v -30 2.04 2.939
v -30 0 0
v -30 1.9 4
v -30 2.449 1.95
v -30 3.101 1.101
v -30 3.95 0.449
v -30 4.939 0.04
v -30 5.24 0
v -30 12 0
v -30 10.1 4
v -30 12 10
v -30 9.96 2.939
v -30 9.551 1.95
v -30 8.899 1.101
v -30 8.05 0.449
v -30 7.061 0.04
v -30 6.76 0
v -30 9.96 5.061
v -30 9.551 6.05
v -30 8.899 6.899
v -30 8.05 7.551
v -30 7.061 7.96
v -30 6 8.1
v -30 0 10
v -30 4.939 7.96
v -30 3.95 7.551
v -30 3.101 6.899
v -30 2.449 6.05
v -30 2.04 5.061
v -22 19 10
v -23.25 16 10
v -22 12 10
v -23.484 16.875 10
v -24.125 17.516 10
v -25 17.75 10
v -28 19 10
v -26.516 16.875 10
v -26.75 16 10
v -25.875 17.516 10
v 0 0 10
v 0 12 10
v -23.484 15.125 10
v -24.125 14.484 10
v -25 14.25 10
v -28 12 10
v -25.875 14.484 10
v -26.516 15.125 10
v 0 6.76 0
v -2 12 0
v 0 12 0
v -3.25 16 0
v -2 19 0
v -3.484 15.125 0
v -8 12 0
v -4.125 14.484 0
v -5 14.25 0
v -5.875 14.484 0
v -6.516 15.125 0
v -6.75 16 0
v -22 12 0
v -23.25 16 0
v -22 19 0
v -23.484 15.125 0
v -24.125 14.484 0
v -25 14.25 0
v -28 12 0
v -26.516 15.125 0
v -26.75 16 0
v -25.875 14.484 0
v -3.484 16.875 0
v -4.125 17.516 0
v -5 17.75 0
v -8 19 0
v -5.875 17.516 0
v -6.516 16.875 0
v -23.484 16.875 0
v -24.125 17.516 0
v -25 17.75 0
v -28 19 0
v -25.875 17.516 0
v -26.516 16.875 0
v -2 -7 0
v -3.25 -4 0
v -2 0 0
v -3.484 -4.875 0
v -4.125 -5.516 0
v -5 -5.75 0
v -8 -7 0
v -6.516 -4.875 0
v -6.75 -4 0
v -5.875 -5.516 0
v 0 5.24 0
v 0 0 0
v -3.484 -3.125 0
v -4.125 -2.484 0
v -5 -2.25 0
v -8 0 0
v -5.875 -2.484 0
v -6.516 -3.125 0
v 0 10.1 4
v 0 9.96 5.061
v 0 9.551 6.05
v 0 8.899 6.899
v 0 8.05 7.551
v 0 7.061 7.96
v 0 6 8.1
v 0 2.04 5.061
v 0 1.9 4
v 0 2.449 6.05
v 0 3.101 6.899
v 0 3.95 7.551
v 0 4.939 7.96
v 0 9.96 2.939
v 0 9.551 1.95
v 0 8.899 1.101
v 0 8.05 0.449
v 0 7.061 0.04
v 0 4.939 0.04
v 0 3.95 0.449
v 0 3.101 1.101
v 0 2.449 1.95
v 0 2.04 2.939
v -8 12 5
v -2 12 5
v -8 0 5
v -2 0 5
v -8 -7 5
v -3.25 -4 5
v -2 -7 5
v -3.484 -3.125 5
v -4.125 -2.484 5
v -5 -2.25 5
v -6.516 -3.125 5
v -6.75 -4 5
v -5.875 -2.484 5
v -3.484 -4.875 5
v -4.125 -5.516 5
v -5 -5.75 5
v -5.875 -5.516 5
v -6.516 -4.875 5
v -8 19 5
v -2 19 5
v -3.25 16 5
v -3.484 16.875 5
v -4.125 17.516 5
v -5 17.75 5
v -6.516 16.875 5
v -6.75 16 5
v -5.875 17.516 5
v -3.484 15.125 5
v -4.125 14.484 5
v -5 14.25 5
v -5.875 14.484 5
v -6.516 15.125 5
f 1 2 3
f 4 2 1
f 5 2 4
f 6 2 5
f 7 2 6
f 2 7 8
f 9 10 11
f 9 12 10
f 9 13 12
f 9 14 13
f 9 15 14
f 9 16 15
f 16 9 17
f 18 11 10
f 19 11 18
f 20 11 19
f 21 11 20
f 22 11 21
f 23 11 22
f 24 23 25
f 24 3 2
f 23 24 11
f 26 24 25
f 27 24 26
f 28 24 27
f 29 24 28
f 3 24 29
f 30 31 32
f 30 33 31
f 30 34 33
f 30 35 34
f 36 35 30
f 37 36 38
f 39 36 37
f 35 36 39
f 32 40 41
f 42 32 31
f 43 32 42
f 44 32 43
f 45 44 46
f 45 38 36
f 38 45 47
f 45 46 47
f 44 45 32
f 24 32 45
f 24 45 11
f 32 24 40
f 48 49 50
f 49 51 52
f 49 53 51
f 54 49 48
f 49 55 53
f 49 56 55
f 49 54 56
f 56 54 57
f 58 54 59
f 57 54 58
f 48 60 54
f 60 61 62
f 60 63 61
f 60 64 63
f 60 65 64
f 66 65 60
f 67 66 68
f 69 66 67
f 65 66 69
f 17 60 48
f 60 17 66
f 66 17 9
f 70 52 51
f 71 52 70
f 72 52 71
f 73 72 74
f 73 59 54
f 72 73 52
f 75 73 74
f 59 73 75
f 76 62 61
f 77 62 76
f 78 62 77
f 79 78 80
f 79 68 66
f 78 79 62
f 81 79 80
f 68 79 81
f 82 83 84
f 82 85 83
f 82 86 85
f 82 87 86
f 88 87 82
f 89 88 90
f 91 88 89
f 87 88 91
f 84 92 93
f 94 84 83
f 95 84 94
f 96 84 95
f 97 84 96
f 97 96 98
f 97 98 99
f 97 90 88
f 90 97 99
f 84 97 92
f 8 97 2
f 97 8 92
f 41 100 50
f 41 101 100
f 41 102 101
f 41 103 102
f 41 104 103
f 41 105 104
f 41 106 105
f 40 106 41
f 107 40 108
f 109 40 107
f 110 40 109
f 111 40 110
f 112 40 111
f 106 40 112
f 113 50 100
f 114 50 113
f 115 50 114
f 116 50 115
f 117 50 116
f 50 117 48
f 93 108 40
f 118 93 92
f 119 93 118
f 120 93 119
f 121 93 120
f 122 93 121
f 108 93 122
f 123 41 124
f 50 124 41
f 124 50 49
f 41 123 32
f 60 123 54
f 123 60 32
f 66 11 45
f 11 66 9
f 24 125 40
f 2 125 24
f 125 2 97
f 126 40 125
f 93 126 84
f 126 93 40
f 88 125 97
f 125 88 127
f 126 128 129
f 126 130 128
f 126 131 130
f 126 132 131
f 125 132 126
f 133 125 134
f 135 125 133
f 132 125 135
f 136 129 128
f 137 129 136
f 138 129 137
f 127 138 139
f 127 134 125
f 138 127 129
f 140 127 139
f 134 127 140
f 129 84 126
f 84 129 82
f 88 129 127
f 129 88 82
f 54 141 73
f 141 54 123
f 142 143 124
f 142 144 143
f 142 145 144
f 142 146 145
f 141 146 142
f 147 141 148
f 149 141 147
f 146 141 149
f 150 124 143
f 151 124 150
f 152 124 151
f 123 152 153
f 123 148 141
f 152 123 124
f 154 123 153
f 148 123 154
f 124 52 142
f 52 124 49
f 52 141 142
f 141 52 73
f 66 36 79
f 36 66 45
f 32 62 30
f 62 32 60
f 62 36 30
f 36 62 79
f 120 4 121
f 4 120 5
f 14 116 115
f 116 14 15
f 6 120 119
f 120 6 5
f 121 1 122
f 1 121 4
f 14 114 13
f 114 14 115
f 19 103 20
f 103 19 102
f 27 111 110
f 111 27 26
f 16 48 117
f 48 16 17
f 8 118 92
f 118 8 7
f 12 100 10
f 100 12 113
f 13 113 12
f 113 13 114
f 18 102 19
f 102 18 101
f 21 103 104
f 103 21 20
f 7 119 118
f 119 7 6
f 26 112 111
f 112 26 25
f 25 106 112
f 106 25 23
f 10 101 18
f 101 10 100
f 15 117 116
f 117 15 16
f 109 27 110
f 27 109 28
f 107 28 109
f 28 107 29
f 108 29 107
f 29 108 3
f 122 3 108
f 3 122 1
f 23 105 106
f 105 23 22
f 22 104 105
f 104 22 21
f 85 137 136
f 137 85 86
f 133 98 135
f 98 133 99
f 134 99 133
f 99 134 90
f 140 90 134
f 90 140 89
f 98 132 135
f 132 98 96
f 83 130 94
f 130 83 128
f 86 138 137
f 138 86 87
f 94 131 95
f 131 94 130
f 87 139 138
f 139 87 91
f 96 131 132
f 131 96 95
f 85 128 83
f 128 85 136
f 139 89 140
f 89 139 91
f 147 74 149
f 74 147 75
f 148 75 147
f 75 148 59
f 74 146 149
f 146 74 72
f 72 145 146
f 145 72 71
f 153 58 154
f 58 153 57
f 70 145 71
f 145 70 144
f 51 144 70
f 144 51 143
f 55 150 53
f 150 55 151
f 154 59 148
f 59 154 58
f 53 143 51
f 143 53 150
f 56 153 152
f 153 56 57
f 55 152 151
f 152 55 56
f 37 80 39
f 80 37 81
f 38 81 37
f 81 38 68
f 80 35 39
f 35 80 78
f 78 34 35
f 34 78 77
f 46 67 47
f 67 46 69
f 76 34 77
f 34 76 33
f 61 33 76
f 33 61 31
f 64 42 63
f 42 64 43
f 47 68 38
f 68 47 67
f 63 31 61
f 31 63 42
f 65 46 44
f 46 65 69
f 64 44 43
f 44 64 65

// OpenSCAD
mirror([1,0,0])
difference()
{
    union()
    {
        cube([30,12,10]);
        
        translate([2,-4-3,0])
            cube([6,8,5]);
            //cylinder(d=3.5,h=4,$fn=12);
        translate([2,11,0])
            cube([6,8,5]);
        translate([2+20,11,0])
            cube([6,8,10]);
    }
    union()
    {
        translate([0,6,4])
            rotate([0,90,0])
                cylinder(d=8.2,h=30,$fn=24);
        
        translate([5,-4,0])
            cylinder(d=3.5,h=10,$fn=12);
        translate([5,6+6+4,0])
            cylinder(d=3.5,h=10,$fn=12);
        translate([5+20,6+6+4,0])
            cylinder(d=3.5,h=10,$fn=12);
    }
}
